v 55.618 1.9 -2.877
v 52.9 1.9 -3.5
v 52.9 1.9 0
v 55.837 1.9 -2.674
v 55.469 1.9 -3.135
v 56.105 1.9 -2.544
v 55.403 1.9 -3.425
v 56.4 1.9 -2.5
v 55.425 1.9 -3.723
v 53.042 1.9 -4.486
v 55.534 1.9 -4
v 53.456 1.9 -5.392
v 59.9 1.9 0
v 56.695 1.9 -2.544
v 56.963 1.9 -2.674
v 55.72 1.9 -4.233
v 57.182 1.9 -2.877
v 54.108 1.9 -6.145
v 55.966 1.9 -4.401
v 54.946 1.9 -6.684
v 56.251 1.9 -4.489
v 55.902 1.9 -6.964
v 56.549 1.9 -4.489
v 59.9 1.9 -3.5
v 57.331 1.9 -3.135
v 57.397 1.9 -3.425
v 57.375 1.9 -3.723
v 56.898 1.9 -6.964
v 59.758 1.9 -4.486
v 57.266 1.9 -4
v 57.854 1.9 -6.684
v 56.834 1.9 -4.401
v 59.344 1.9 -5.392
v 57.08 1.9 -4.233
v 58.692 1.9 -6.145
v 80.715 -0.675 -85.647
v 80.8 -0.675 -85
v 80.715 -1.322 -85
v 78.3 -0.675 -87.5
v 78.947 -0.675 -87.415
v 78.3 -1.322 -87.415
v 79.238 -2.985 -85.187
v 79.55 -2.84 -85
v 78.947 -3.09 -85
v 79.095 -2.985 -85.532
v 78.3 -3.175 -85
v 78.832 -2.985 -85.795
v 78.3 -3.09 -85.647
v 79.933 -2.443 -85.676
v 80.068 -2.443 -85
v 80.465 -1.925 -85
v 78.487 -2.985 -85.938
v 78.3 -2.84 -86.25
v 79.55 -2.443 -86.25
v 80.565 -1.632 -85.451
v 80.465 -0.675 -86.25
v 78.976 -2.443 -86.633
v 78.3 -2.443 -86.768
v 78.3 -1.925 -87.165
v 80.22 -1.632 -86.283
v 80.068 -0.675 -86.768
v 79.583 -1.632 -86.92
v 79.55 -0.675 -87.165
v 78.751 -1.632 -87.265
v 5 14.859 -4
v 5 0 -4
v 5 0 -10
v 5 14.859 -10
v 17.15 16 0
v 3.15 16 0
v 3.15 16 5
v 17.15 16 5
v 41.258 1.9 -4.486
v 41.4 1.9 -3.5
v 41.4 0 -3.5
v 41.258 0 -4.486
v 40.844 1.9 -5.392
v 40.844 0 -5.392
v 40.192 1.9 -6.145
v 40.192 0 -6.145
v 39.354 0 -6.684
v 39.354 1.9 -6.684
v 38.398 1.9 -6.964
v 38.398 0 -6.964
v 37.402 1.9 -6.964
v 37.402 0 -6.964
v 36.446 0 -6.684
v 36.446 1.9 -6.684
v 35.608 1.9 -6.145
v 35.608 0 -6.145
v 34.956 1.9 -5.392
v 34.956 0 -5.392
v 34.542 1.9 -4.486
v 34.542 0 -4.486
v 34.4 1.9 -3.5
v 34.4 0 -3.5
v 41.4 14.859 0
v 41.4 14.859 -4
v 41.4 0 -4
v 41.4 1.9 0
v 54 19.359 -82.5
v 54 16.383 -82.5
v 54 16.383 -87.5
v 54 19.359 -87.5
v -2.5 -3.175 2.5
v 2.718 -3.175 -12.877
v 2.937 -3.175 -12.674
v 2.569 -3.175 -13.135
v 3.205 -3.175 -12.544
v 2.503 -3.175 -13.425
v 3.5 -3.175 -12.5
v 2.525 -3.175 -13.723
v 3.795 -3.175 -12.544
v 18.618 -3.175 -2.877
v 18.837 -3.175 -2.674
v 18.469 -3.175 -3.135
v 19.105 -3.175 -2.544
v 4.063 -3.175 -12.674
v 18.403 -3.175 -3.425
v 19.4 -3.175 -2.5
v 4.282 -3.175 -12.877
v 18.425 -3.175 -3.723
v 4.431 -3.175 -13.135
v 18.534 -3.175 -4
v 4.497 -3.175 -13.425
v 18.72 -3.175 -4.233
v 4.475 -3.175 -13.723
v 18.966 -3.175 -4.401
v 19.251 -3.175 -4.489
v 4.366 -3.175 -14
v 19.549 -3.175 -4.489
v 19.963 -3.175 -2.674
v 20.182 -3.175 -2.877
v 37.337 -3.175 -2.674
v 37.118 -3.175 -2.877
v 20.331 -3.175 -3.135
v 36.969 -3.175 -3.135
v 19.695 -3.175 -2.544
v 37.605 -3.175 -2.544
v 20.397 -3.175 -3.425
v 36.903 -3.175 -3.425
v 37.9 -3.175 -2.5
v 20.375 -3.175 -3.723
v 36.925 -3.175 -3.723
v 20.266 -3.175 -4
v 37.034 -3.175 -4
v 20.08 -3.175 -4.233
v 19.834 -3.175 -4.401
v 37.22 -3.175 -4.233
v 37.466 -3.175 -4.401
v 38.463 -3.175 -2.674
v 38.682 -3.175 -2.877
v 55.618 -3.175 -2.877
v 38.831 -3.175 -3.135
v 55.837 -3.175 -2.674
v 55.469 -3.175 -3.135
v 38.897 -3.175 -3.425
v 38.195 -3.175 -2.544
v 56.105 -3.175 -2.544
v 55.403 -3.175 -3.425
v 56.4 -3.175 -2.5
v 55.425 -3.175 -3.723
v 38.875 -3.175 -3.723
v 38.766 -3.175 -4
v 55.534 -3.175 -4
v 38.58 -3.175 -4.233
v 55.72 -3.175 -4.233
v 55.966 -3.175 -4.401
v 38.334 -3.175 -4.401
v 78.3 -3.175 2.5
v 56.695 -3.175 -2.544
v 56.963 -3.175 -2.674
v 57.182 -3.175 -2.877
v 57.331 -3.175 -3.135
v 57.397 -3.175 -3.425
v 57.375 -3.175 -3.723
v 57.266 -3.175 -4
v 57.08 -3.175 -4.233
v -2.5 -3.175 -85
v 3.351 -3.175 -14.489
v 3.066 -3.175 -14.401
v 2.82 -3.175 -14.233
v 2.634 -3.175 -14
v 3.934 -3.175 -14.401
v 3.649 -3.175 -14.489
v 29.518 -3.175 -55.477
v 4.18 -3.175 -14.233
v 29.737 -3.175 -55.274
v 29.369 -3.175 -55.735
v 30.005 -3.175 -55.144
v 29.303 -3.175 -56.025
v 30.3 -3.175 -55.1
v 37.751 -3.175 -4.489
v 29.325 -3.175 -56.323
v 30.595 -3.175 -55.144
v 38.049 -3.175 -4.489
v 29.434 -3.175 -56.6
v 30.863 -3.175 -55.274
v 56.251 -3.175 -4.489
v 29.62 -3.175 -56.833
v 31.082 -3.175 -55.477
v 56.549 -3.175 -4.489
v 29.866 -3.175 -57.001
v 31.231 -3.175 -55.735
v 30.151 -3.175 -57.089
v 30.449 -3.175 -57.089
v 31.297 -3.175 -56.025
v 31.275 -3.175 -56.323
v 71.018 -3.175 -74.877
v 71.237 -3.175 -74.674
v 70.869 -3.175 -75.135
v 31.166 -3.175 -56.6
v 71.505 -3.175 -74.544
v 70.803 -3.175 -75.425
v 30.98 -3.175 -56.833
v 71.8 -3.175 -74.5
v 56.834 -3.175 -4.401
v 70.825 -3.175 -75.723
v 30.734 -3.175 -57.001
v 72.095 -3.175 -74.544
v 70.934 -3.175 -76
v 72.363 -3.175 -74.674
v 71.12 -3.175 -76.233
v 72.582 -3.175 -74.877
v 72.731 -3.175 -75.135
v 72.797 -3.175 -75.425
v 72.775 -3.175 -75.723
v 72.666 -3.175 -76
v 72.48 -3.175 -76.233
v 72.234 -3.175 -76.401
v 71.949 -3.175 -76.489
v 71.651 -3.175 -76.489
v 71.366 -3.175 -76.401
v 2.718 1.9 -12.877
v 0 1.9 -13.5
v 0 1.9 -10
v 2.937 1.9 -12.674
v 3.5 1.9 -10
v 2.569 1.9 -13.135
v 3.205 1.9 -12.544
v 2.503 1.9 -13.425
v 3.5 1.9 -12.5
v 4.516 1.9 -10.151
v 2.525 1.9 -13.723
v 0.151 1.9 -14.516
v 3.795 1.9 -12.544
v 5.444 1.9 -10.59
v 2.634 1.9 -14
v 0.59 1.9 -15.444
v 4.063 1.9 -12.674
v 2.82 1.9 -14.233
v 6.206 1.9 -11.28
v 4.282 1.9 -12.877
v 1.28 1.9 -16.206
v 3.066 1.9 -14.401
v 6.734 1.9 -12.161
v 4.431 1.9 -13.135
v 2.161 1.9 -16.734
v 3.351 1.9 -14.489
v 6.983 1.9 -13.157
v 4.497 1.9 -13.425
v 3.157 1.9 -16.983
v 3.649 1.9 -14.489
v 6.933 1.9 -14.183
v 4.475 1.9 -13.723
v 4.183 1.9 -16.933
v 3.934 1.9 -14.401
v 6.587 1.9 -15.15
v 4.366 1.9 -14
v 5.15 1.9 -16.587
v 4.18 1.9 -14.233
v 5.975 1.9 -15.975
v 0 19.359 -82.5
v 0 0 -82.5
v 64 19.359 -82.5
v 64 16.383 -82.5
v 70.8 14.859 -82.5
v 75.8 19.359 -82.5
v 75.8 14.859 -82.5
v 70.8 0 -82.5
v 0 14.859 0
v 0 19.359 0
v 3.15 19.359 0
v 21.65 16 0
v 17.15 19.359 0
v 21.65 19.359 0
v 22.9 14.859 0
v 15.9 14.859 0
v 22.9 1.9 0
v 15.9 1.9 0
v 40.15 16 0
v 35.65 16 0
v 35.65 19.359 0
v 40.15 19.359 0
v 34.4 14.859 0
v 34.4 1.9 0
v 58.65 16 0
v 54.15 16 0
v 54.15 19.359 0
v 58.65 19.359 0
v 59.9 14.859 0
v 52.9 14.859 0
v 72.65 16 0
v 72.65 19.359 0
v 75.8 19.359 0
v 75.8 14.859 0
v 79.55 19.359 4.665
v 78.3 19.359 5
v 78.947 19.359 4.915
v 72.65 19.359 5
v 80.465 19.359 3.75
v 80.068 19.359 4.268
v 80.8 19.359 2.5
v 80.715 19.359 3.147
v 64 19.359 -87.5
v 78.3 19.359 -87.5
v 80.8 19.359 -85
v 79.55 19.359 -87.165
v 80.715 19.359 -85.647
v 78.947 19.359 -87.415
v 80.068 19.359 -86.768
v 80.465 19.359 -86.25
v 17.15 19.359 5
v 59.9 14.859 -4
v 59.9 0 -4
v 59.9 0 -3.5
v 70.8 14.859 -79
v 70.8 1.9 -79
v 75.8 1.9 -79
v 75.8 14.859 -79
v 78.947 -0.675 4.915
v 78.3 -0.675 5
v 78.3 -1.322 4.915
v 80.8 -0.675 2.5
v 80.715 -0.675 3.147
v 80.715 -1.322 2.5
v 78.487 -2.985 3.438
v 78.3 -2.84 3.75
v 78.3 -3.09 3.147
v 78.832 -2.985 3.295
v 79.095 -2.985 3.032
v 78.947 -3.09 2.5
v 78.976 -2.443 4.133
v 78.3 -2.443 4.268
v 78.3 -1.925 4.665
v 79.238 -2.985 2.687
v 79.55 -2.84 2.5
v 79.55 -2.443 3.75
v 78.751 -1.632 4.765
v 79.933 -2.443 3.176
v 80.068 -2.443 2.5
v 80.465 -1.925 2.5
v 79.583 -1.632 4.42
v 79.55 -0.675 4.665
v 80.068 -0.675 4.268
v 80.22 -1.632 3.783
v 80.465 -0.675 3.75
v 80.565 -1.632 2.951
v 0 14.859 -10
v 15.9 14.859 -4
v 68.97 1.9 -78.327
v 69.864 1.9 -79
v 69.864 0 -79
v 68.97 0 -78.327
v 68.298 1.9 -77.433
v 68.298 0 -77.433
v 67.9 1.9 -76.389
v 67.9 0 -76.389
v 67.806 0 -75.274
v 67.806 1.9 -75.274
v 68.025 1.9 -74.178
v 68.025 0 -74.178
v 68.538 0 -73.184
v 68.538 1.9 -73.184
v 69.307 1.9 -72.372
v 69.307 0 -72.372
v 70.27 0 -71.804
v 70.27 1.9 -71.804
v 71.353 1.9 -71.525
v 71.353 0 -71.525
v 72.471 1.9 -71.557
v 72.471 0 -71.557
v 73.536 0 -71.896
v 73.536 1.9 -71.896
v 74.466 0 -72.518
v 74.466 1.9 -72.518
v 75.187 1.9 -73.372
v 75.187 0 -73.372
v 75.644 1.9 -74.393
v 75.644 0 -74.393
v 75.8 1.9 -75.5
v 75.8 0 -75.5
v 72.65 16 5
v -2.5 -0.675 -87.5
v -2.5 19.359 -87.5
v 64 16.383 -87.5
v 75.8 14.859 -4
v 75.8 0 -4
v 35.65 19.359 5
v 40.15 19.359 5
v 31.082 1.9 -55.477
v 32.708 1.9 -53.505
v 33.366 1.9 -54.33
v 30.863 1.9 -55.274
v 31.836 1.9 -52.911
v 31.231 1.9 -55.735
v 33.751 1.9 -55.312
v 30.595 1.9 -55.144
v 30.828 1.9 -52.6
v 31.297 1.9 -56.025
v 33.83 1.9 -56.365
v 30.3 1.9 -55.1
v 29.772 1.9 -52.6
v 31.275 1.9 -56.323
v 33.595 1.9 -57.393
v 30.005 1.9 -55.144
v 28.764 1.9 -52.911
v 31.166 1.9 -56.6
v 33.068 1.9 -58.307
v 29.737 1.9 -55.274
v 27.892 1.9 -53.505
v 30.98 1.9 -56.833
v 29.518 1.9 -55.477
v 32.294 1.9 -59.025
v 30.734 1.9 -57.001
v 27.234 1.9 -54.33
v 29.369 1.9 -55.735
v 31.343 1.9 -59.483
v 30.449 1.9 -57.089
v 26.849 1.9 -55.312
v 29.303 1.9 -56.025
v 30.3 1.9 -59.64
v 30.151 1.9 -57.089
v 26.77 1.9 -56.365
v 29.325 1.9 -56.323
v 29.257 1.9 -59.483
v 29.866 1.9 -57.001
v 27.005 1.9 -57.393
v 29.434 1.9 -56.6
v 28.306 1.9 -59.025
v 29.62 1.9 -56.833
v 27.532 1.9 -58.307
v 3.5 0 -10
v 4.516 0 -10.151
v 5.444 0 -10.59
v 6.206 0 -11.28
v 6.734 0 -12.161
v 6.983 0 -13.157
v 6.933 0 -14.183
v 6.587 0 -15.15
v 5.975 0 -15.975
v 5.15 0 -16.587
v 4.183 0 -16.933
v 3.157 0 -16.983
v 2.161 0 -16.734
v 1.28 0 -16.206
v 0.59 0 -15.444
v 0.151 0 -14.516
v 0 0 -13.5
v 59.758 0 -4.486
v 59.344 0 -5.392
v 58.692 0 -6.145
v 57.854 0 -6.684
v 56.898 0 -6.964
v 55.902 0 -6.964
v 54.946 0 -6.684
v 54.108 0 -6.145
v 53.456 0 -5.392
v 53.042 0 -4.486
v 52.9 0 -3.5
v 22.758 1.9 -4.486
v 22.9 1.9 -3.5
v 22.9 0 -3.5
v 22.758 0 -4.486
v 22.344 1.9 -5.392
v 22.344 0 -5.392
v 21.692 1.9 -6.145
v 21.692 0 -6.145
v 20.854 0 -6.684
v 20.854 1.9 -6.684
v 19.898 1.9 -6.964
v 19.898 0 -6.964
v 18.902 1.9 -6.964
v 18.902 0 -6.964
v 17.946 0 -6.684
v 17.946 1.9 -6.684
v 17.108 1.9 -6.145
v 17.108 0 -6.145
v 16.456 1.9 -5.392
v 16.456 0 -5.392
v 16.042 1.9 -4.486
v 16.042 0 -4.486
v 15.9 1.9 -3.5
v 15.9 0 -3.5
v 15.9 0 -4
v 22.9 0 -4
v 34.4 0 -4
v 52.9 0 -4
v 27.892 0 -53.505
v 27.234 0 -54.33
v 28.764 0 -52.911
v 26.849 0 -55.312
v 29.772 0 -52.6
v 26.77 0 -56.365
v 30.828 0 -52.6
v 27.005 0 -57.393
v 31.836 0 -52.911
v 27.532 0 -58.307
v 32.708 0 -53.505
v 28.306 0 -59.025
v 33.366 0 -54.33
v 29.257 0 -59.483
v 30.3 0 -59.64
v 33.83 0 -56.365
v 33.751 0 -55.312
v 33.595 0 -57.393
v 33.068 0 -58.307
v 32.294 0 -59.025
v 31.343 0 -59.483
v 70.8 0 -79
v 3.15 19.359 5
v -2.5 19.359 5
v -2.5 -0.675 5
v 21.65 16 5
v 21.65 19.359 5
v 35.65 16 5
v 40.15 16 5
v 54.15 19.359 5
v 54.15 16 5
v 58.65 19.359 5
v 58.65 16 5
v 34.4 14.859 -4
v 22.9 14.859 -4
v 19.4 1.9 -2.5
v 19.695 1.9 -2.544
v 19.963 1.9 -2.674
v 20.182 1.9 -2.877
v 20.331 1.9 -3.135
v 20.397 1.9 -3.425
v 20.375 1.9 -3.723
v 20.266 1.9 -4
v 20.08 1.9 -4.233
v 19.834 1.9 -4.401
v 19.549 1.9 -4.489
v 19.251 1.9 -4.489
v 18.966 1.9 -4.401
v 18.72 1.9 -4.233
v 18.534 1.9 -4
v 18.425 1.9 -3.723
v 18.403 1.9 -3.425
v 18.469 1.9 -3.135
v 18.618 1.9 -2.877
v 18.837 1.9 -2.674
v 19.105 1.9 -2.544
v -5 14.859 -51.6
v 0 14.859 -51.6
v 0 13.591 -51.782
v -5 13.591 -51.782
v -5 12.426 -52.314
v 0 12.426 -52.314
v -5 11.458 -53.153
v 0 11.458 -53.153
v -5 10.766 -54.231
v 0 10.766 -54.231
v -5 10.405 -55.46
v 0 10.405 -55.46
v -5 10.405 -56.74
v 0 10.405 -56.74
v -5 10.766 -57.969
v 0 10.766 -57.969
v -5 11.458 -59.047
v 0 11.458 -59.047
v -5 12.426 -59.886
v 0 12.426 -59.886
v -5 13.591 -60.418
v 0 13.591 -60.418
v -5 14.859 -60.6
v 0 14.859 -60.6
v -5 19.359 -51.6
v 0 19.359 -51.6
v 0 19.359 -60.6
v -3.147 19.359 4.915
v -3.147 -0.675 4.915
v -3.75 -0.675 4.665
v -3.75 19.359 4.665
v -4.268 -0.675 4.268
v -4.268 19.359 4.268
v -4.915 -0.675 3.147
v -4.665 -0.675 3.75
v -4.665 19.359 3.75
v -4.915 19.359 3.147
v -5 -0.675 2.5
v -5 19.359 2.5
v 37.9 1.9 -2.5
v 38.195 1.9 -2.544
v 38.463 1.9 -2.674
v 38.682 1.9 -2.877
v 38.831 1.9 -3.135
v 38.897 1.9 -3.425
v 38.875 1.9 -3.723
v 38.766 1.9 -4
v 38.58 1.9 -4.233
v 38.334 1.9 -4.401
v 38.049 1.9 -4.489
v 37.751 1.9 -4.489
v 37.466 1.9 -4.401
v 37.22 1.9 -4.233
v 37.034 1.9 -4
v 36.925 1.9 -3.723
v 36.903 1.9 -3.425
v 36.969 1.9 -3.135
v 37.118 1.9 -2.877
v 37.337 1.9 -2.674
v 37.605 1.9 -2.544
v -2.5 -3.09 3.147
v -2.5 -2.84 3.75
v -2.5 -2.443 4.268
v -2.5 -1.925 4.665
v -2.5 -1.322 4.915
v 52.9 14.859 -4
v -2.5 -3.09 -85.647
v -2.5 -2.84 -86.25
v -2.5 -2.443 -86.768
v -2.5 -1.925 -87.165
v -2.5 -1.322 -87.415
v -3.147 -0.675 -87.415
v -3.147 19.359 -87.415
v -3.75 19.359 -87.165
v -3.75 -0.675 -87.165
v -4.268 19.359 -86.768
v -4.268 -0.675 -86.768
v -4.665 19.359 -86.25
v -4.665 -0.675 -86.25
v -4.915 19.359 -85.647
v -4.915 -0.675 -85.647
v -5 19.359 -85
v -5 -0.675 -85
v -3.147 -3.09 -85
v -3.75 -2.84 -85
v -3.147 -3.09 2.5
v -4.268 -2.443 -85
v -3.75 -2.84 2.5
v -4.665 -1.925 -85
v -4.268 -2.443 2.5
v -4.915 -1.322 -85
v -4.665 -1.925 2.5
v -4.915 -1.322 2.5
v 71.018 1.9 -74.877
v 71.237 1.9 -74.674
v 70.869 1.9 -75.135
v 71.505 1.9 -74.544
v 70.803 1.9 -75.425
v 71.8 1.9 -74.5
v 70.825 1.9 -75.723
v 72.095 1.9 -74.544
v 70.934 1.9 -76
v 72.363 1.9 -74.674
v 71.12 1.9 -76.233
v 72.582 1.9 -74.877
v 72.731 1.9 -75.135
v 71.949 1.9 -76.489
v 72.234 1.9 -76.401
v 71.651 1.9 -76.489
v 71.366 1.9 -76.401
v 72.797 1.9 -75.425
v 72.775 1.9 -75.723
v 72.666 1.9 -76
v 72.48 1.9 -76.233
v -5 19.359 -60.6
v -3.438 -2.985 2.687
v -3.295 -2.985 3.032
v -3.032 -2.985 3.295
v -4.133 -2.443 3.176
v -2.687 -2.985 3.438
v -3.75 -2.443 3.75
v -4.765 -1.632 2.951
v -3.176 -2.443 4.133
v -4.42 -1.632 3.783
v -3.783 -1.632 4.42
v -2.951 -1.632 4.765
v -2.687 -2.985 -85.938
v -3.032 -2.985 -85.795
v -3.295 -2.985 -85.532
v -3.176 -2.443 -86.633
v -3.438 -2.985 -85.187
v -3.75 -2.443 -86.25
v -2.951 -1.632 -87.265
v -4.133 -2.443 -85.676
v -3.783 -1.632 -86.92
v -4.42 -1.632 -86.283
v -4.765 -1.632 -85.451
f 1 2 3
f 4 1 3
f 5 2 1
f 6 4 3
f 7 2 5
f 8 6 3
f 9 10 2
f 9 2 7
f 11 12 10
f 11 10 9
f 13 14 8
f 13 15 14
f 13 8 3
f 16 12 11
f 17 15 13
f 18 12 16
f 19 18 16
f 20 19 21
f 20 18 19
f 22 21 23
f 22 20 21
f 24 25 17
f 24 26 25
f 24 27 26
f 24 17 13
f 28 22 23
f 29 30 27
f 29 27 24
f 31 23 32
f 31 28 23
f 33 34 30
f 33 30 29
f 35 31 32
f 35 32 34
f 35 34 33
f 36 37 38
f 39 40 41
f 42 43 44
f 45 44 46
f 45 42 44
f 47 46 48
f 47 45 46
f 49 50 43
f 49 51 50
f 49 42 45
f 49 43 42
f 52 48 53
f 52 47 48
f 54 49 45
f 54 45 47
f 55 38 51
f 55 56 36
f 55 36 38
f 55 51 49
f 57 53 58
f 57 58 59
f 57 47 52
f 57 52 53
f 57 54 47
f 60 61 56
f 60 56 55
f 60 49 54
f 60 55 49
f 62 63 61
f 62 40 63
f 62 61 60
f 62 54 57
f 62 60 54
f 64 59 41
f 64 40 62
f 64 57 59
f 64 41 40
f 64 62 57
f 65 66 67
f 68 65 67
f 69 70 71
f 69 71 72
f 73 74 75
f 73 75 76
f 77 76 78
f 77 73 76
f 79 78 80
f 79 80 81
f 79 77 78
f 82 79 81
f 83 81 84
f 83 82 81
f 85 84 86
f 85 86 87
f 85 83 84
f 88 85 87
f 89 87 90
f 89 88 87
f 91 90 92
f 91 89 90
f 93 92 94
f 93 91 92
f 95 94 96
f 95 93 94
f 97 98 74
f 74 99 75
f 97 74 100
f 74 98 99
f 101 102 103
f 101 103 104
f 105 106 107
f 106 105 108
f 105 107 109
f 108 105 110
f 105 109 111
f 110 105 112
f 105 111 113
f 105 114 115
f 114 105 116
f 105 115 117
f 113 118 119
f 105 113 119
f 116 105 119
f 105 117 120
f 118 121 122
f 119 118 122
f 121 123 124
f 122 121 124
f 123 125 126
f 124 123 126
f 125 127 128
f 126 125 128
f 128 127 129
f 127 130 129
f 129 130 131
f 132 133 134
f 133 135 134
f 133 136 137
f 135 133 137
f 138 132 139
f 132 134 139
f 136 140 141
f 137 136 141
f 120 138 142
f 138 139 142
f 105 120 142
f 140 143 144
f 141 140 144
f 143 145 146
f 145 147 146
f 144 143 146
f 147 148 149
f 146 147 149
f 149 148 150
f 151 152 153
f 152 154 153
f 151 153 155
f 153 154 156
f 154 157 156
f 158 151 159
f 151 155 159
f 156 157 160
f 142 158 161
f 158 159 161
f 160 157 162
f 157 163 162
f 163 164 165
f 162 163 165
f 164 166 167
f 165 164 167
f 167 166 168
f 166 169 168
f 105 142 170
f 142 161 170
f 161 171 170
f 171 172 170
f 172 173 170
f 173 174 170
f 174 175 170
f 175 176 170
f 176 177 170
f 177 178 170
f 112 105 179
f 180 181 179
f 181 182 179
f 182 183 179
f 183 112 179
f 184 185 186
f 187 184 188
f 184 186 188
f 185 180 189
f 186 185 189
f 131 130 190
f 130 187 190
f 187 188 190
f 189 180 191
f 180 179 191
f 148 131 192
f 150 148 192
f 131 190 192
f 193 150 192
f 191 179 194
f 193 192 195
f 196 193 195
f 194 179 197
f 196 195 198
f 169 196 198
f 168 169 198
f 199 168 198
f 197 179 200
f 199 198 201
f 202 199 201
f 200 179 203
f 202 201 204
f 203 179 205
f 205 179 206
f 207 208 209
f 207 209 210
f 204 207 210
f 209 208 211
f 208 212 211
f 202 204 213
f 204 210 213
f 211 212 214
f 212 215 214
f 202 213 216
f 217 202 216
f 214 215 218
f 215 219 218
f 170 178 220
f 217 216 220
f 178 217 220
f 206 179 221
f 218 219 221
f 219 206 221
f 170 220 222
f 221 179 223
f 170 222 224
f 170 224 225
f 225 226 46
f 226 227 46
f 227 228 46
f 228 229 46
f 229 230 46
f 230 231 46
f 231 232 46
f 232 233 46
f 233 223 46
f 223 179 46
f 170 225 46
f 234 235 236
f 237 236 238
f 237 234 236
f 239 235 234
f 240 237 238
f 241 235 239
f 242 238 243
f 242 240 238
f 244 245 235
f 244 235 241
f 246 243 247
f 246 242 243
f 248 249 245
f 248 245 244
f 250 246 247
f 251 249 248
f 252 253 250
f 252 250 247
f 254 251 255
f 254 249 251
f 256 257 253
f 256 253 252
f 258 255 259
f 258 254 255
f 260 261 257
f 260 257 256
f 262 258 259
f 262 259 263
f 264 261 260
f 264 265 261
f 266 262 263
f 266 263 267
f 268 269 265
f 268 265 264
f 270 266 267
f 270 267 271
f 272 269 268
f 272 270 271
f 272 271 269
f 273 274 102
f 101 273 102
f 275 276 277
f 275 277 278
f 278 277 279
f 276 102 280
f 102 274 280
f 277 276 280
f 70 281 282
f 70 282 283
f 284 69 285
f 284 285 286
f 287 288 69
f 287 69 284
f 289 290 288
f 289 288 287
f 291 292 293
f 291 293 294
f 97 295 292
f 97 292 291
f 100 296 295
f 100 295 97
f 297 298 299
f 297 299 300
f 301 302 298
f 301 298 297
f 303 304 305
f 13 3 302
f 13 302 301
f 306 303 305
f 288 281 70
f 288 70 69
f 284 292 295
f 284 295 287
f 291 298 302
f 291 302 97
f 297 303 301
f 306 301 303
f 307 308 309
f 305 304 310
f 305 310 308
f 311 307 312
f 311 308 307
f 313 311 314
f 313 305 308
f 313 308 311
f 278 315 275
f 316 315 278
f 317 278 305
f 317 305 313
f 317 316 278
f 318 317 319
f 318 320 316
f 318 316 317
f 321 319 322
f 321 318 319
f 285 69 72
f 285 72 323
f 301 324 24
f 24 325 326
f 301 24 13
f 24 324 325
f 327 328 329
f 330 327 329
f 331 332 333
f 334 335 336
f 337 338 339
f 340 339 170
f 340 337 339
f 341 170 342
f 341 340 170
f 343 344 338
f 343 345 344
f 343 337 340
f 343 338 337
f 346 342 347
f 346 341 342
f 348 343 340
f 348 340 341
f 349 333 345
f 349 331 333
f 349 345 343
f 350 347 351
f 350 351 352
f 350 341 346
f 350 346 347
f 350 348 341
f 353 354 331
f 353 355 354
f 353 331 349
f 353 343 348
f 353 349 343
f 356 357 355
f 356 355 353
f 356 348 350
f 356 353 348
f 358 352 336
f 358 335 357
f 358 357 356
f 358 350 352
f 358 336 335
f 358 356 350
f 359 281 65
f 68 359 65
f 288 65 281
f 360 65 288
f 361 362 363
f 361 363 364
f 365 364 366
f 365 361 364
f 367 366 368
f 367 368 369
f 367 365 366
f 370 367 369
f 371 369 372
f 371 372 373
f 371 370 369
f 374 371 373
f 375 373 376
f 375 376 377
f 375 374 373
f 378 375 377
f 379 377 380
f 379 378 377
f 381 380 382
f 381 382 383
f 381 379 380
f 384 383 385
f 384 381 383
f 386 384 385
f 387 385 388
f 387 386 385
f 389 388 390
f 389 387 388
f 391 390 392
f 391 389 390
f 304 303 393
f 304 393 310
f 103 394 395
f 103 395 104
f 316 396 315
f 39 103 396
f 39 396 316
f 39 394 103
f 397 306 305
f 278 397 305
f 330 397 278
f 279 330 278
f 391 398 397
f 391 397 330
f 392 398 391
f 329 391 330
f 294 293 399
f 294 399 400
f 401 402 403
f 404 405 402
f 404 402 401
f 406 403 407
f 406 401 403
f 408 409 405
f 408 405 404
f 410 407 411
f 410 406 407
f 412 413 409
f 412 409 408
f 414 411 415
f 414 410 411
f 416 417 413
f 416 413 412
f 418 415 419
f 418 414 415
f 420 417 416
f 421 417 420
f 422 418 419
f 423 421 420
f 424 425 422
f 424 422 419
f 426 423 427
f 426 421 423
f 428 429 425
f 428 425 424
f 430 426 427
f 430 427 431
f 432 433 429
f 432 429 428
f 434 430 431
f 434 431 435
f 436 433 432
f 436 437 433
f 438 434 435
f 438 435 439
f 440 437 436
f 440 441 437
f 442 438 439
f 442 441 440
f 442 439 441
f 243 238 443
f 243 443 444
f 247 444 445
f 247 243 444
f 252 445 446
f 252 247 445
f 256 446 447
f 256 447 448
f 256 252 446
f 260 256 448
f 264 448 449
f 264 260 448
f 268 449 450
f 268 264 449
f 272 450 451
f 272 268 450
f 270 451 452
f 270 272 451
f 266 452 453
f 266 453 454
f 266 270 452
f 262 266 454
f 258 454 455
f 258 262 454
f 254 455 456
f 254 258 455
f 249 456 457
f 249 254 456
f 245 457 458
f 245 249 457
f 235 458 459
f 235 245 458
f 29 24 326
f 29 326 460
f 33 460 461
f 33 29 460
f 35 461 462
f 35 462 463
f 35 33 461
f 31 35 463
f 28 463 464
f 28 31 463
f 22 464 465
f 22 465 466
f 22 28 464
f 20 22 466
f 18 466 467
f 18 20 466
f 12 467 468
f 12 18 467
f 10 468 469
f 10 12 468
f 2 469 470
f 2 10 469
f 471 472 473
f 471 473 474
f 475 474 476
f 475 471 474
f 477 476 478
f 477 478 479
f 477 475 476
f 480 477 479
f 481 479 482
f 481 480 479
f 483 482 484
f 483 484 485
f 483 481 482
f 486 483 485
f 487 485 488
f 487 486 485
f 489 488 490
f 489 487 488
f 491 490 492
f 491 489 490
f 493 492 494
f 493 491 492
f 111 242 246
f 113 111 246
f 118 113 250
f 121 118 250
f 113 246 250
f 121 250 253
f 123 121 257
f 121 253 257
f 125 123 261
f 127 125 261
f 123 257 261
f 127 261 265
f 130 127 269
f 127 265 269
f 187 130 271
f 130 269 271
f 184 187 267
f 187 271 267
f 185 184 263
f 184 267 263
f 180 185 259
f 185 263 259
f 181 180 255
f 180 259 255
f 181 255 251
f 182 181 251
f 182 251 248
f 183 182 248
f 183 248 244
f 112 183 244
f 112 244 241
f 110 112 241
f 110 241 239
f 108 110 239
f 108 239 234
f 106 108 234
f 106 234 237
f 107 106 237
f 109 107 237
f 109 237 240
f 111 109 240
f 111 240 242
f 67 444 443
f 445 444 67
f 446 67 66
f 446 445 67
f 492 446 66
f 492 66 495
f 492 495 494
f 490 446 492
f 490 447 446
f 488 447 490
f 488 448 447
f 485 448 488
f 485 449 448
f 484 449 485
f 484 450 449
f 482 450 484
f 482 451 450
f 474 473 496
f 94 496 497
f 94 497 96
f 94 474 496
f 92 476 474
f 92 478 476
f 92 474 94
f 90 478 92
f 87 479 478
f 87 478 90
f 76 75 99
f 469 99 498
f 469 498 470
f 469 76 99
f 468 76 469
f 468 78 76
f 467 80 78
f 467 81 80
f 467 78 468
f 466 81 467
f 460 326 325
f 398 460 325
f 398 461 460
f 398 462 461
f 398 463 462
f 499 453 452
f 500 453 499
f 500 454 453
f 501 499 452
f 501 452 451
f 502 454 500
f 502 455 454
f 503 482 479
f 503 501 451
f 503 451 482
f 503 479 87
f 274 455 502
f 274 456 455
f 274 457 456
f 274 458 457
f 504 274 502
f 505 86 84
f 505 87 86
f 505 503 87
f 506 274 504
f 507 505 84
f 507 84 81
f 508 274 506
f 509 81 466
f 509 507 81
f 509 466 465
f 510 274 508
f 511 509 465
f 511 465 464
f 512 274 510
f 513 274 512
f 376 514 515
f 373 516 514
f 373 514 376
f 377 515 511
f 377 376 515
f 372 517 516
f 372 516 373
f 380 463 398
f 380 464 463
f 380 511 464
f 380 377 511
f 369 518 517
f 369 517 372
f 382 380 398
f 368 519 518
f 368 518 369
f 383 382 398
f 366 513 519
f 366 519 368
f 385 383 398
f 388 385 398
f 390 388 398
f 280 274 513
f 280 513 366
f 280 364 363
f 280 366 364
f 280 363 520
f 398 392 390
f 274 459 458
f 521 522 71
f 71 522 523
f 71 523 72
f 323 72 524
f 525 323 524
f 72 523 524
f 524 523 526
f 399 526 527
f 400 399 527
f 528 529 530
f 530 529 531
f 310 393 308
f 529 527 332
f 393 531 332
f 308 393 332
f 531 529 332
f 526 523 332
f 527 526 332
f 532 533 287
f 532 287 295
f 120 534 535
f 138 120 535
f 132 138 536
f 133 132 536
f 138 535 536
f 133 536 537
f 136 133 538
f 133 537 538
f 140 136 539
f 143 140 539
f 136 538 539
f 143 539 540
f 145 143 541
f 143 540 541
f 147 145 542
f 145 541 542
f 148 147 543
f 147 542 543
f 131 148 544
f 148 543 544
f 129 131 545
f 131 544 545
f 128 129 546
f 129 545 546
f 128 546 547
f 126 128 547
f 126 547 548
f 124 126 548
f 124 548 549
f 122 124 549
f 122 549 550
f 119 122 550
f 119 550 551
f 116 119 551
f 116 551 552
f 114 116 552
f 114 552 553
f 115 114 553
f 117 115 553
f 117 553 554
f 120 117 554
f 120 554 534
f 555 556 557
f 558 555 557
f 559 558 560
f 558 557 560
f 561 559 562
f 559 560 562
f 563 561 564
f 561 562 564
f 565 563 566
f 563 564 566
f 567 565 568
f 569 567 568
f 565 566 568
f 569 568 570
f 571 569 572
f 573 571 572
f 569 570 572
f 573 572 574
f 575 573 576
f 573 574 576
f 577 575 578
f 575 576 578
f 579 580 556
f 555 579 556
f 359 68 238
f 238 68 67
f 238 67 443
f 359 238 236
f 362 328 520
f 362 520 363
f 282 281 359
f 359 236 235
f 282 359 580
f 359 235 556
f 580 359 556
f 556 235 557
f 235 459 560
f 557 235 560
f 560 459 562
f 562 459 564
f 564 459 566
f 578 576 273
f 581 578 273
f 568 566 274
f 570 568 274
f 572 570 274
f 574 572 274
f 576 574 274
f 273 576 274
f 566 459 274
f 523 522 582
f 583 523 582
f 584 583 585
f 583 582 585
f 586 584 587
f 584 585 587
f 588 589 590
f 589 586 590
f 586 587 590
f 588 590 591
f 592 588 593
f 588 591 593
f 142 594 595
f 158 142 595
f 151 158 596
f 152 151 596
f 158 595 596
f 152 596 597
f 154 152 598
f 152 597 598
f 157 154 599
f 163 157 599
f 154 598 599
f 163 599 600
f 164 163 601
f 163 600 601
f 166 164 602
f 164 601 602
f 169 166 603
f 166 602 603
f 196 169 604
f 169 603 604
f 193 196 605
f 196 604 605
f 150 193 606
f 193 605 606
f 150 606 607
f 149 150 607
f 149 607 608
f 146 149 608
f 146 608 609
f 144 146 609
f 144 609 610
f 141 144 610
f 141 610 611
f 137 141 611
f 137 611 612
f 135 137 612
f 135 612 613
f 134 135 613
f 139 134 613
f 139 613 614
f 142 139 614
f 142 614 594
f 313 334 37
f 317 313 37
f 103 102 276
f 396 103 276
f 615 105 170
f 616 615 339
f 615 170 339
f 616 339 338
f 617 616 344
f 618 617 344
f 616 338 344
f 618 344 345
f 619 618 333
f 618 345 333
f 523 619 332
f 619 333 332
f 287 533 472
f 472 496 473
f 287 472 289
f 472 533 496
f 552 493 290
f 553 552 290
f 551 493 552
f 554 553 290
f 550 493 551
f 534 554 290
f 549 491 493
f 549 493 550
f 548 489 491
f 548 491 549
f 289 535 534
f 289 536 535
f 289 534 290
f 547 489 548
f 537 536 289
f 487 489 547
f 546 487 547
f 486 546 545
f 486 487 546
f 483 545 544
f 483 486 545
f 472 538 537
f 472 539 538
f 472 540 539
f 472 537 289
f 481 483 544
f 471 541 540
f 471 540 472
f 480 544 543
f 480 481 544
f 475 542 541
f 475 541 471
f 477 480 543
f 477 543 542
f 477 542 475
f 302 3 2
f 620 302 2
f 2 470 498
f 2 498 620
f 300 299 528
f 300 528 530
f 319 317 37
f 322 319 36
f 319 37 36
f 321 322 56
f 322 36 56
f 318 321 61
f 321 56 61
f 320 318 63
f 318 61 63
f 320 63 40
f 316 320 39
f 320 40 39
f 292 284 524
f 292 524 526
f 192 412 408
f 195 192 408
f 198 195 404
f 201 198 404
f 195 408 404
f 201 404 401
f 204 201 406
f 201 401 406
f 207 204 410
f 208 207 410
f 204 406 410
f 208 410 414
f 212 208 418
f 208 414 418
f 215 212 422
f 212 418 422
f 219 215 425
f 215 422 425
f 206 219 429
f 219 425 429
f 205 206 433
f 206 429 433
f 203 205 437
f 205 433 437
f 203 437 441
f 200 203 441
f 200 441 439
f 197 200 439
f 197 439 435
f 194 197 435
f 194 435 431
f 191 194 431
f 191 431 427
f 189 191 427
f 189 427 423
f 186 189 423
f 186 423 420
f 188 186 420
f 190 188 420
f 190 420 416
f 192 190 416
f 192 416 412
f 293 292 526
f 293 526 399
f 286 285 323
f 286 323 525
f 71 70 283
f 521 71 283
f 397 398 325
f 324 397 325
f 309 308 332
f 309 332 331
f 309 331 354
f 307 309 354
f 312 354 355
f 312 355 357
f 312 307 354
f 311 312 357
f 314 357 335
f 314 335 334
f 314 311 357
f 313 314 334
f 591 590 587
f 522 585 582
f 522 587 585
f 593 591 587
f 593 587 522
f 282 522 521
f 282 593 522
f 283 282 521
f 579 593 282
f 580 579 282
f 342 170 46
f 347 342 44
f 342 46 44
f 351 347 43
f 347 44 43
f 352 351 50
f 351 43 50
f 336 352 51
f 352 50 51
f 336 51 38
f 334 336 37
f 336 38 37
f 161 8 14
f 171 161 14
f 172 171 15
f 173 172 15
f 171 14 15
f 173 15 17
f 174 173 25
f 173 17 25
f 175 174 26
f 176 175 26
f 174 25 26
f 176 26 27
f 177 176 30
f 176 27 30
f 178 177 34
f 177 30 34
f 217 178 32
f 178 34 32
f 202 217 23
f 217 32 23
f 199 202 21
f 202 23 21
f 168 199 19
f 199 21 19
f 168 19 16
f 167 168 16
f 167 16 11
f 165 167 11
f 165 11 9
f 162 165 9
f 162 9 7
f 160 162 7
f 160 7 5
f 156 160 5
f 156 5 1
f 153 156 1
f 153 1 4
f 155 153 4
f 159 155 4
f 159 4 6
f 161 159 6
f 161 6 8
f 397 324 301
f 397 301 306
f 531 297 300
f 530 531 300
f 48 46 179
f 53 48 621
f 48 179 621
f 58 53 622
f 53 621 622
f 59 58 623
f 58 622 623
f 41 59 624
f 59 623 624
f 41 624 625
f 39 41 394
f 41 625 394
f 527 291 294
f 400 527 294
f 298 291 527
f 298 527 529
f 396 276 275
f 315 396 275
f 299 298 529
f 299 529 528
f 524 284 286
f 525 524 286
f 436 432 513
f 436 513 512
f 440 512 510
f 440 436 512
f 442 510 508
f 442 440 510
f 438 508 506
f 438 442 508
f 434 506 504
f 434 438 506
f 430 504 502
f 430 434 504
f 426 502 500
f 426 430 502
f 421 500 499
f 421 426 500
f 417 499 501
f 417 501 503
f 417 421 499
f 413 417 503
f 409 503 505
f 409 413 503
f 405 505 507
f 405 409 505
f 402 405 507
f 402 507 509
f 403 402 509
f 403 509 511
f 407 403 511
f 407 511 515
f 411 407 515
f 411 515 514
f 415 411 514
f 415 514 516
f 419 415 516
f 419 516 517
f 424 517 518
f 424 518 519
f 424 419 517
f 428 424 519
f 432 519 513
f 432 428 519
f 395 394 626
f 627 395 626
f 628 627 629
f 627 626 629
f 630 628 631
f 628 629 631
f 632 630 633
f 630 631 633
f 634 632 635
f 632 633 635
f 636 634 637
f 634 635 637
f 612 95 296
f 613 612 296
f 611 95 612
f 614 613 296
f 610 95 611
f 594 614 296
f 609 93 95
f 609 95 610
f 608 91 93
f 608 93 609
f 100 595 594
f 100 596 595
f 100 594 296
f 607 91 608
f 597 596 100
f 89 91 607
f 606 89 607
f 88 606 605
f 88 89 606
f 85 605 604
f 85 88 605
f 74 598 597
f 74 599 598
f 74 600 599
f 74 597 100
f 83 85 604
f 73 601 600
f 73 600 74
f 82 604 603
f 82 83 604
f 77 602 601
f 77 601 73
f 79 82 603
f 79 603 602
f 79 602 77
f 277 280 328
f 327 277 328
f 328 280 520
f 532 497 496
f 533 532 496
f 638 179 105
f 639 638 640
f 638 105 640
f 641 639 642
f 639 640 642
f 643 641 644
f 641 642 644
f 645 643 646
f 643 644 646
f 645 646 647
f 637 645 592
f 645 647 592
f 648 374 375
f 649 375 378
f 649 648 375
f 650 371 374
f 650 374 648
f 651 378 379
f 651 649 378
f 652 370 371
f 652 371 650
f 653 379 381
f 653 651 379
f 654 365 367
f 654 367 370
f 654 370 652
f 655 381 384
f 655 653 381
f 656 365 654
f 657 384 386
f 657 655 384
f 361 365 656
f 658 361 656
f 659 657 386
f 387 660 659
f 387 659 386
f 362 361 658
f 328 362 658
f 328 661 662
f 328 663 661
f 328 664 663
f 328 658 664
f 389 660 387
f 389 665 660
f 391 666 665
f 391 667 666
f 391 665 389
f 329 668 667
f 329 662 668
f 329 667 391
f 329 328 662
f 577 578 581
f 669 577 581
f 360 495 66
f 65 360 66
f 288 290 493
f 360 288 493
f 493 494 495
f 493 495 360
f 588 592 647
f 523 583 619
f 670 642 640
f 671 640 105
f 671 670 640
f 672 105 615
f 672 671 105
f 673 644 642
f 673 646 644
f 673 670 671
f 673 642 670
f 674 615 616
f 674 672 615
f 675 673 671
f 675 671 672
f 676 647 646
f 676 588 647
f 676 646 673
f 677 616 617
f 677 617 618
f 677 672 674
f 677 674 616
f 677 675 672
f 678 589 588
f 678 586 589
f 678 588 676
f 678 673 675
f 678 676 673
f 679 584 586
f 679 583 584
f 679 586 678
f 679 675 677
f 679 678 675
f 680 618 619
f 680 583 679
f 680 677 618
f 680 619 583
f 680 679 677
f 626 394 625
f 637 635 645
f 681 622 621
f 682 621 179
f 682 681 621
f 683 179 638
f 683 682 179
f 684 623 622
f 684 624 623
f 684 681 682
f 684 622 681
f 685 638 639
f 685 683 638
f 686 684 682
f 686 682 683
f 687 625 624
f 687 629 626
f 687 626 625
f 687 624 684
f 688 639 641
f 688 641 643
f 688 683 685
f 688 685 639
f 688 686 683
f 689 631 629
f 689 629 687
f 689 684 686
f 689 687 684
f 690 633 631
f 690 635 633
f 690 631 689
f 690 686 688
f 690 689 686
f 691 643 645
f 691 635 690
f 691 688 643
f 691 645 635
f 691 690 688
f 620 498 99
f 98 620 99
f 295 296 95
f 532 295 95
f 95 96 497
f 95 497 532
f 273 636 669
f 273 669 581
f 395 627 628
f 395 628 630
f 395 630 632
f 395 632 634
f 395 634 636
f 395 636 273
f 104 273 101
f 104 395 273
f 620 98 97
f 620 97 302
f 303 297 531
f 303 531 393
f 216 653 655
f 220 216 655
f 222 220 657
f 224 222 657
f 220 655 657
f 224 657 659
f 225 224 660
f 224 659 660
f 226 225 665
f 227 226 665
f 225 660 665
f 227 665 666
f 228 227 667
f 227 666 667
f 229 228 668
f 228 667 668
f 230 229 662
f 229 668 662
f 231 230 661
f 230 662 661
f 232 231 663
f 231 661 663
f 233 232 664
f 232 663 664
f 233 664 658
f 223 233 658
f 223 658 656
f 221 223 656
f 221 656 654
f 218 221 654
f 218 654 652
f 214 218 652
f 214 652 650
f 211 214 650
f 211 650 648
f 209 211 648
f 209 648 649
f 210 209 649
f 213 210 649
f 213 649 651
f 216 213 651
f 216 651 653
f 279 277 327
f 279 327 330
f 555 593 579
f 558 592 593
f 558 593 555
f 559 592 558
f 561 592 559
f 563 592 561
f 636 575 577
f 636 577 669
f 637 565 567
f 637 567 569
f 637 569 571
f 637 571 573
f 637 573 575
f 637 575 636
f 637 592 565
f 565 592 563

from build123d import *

# Parameters (mm, degrees)
SKETCH1_W           = 85.8
SKETCH1_H           = 92.5
BOSS_EXTRUDE1_DEPTH = 14.859
SKETCH2_W           = 85.8
SKETCH2_H           = 92.5
SKETCH2_R           = 1
BOSS_EXTRUDE2_DEPTH = 3.175
SKETCH4_W           = 85.8
SKETCH4_H           = 92.5
SKETCH4_W_2         = 75.8
SKETCH4_H_2         = 82.5
BOSS_EXTRUDE3_DEPTH = 4.5
CUT_EXTRUDE1_DEPTH  = 121.663419813
SKETCH5_W           = 14
SKETCH5_H           = 8
CUT_EXTRUDE2_DEPTH  = 121.663419813
SKETCH6_W           = 10
SKETCH6_H           = 6
CUT_EXTRUDE3_DEPTH  = 121.663419813
BOSS_EXTRUDE4_START = 1.9
SKETCH7_R           = 3.54
SKETCH7_R_2         = 1
BOSS_EXTRUDE4_DEPTH = 1.9
FILLET1_R           = 2.5
FILLET2_R           = 2.5
FILLET3_R           = 2.5
FILLET4_R           = 2.5
FILLET5_R           = 2.5


with BuildPart() as part:
    # Sketch1 → Boss-Extrude1 (new body)
    with BuildSketch(Plane(origin=(0, 0, 0), x_dir=(1, 0, 0), z_dir=(0, 1, 0))):
        with Locations((37.9, 41.25)):
            Rectangle(SKETCH1_W, SKETCH1_H)
        Polygon((5, 4), (5, 10), (0, 10), (0, 82.5), (70.8, 82.5), (70.8, 79), (75.8, 79), (75.8, 4), (59.9, 4), (59.9, 0), (52.9, 0), (52.9, 4), (41.4, 4), (41.4, 0), (34.4, 0), (34.4, 4), (22.9, 4), (22.9, 0), (15.9, 0), (15.9, 4), align=None, mode=Mode.SUBTRACT)
    extrude(amount=BOSS_EXTRUDE1_DEPTH)

    # Sketch2 → Boss-Extrude2 (add)
    with BuildSketch(Plane(origin=(0, 0, 0), x_dir=(1, 0, 0), z_dir=(0, 1, 0))):
        with Locations((37.9, 41.25)):
            Rectangle(SKETCH2_W, SKETCH2_H)
        with Locations(Location((3.5, 13.5, 0), (0, 0, 270))):
            Circle(SKETCH2_R, mode=Mode.SUBTRACT)
        with Locations(Location((19.4, 3.5, 0), (0, 0, 270))):
            Circle(SKETCH2_R, mode=Mode.SUBTRACT)
        with Locations(Location((37.9, 3.5, 0), (0, 0, 270))):
            Circle(SKETCH2_R, mode=Mode.SUBTRACT)
        with Locations(Location((56.4, 3.5, 0), (0, 0, 270))):
            Circle(SKETCH2_R, mode=Mode.SUBTRACT)
        with Locations(Location((30.3, 56.1, 0), (0, 0, 270))):
            Circle(SKETCH2_R, mode=Mode.SUBTRACT)
        with Locations(Location((71.8, 75.5, 0), (0, 0, 270))):
            Circle(SKETCH2_R, mode=Mode.SUBTRACT)
    extrude(amount=-BOSS_EXTRUDE2_DEPTH)

    # Sketch4 → Boss-Extrude3 (add)
    with BuildSketch(Plane(origin=(0, 14.859, 0), x_dir=(1, 0, 0), z_dir=(0, 1, 0))):
        with Locations((37.9, 41.25)):
            Rectangle(SKETCH4_W, SKETCH4_H)
        with Locations((37.9, 41.25)):
            Rectangle(SKETCH4_W_2, SKETCH4_H_2, mode=Mode.SUBTRACT)
    extrude(amount=BOSS_EXTRUDE3_DEPTH)

    # Sketch3 → Cut-Extrude1 (cut, through all)
    with BuildSketch(Plane(origin=(0, 0, 0), x_dir=(0, 0, -1), z_dir=(1, 0, 0))):
        with BuildLine():
            Line((60.6, 14.859), (60.6, 19.359))
            Line((60.6, 19.359), (51.6, 19.359))
            Line((51.6, 19.359), (51.6, 14.859))
            ThreePointArc((51.6, 14.859), (56.1, 10.359), (60.6, 14.859))
        make_face()
    extrude(amount=-CUT_EXTRUDE1_DEPTH, mode=Mode.SUBTRACT)

    # Sketch5 → Cut-Extrude2 (cut, through all)
    with BuildSketch(Plane.XY):
        with Locations((10.15, 20)):
            Rectangle(SKETCH5_W, SKETCH5_H)
        with Locations((28.65, 20)):
            Rectangle(SKETCH5_W, SKETCH5_H)
        with Locations((47.15, 20)):
            Rectangle(SKETCH5_W, SKETCH5_H)
        with Locations((65.65, 20)):
            Rectangle(SKETCH5_W, SKETCH5_H)
    extrude(amount=CUT_EXTRUDE2_DEPTH, mode=Mode.SUBTRACT)

    # Sketch6 → Cut-Extrude3 (cut, through all)
    with BuildSketch(Plane.XY):
        with Locations((59, 19.383)):
            Rectangle(SKETCH6_W, SKETCH6_H)
    extrude(amount=-CUT_EXTRUDE3_DEPTH, mode=Mode.SUBTRACT)

    # Sketch7 → Boss-Extrude4 (add)
    # profile 1 of 6: a face of its own
    with BuildSketch(Plane(origin=(0, 0, 0), x_dir=(1, 0, 0), z_dir=(0, 1, 0)).offset(BOSS_EXTRUDE4_START)):
        with Locations(Location((30.3, 56.1, 0), (0, 0, 90))):
            Circle(SKETCH7_R)
        with Locations(Location((30.3, 56.1, 0), (0, 0, 270))):
            Circle(SKETCH7_R_2, mode=Mode.SUBTRACT)
    # profile 2 of 6: a face of its own
    with BuildSketch(Plane(origin=(0, 0, 0), x_dir=(1, 0, 0), z_dir=(0, 1, 0)).offset(BOSS_EXTRUDE4_START)):
        with BuildLine():
            Line((0, 13.5), (0, 10))
            Line((0, 10), (3.5, 10))
            ThreePointArc((3.5, 10), (5.974873734, 15.974873734), (0, 13.5))
        make_face()
        with Locations(Location((3.5, 13.5, 0), (0, 0, 270))):
            Circle(SKETCH7_R_2, mode=Mode.SUBTRACT)
    # profile 3 of 6: a face of its own
    with BuildSketch(Plane(origin=(0, 0, 0), x_dir=(1, 0, 0), z_dir=(0, 1, 0)).offset(BOSS_EXTRUDE4_START)):
        with BuildLine():
            Line((15.9, 3.5), (15.9, 0))
            Line((15.9, 0), (22.9, 0))
            Line((22.9, 0), (22.9, 3.5))
            ThreePointArc((22.9, 3.5), (19.4, 7), (15.9, 3.5))
        make_face()
        with Locations(Location((19.4, 3.5, 0), (0, 0, 270))):
            Circle(SKETCH7_R_2, mode=Mode.SUBTRACT)
    # profile 4 of 6: a face of its own
    with BuildSketch(Plane(origin=(0, 0, 0), x_dir=(1, 0, 0), z_dir=(0, 1, 0)).offset(BOSS_EXTRUDE4_START)):
        with BuildLine():
            Line((34.4, 3.5), (34.4, 0))
            Line((34.4, 0), (41.4, 0))
            Line((41.4, 0), (41.4, 3.5))
            ThreePointArc((41.4, 3.5), (37.9, 7), (34.4, 3.5))
        make_face()
        with Locations(Location((37.9, 3.5, 0), (0, 0, 270))):
            Circle(SKETCH7_R_2, mode=Mode.SUBTRACT)
    # profile 5 of 6: a face of its own
    with BuildSketch(Plane(origin=(0, 0, 0), x_dir=(1, 0, 0), z_dir=(0, 1, 0)).offset(BOSS_EXTRUDE4_START)):
        with BuildLine():
            Line((52.9, 3.5), (52.9, 0))
            Line((52.9, 0), (59.9, 0))
            Line((59.9, 0), (59.9, 3.5))
            ThreePointArc((59.9, 3.5), (56.4, 7), (52.9, 3.5))
        make_face()
        with Locations(Location((56.4, 3.5, 0), (0, 0, 270))):
            Circle(SKETCH7_R_2, mode=Mode.SUBTRACT)
    # profile 6 of 6: a face of its own
    with BuildSketch(Plane(origin=(0, 0, 0), x_dir=(1, 0, 0), z_dir=(0, 1, 0)).offset(BOSS_EXTRUDE4_START)):
        with BuildLine():
            Line((75.8, 79), (69.863508327, 79))
            ThreePointArc((69.863508327, 79), (69.768493994, 72.054280431), (75.8, 75.5))
            Line((75.8, 75.5), (75.8, 79))
        make_face()
        with Locations(Location((71.8, 75.5, 0), (0, 0, 270))):
            Circle(SKETCH7_R_2, mode=Mode.SUBTRACT)
    extrude(amount=-BOSS_EXTRUDE4_DEPTH)

    # Fillet1
    fillet1_edges = [part.edges().sort_by_distance(p)[0] for p in [
        (-5, 8.092, 5),
    ]]
    fillet(fillet1_edges, radius=FILLET1_R)

    # Fillet2
    fillet2_edges = [part.edges().sort_by_distance(p)[0] for p in [
        (80.8, 8.092, 5),
    ]]
    fillet(fillet2_edges, radius=FILLET2_R)

    # Fillet3
    fillet3_edges = [part.edges().sort_by_distance(p)[0] for p in [
        (80.8, 8.092, -87.5),
    ]]
    fillet(fillet3_edges, radius=FILLET3_R)

    # Fillet4
    fillet4_edges = [part.edges().sort_by_distance(p)[0] for p in [
        (-5, 8.092, -87.5),
    ]]
    fillet(fillet4_edges, radius=FILLET4_R)

    # Fillet5
    fillet5_edges = [part.edges().sort_by_distance(p)[0] for p in [
        (37.9, -3.175, 5),
        (-4.267766953, -3.175, 4.267766953),
        (80.8, -3.175, -41.25),
        (80.067766953, -3.175, 4.267766953),
        (37.9, -3.175, -87.5),
        (80.067766953, -3.175, -86.767766953),
        (-5, -3.175, -41.25),
        (-4.267766953, -3.175, -86.767766953),
    ]]
    fillet(fillet5_edges, radius=FILLET5_R)


solid = part.part
